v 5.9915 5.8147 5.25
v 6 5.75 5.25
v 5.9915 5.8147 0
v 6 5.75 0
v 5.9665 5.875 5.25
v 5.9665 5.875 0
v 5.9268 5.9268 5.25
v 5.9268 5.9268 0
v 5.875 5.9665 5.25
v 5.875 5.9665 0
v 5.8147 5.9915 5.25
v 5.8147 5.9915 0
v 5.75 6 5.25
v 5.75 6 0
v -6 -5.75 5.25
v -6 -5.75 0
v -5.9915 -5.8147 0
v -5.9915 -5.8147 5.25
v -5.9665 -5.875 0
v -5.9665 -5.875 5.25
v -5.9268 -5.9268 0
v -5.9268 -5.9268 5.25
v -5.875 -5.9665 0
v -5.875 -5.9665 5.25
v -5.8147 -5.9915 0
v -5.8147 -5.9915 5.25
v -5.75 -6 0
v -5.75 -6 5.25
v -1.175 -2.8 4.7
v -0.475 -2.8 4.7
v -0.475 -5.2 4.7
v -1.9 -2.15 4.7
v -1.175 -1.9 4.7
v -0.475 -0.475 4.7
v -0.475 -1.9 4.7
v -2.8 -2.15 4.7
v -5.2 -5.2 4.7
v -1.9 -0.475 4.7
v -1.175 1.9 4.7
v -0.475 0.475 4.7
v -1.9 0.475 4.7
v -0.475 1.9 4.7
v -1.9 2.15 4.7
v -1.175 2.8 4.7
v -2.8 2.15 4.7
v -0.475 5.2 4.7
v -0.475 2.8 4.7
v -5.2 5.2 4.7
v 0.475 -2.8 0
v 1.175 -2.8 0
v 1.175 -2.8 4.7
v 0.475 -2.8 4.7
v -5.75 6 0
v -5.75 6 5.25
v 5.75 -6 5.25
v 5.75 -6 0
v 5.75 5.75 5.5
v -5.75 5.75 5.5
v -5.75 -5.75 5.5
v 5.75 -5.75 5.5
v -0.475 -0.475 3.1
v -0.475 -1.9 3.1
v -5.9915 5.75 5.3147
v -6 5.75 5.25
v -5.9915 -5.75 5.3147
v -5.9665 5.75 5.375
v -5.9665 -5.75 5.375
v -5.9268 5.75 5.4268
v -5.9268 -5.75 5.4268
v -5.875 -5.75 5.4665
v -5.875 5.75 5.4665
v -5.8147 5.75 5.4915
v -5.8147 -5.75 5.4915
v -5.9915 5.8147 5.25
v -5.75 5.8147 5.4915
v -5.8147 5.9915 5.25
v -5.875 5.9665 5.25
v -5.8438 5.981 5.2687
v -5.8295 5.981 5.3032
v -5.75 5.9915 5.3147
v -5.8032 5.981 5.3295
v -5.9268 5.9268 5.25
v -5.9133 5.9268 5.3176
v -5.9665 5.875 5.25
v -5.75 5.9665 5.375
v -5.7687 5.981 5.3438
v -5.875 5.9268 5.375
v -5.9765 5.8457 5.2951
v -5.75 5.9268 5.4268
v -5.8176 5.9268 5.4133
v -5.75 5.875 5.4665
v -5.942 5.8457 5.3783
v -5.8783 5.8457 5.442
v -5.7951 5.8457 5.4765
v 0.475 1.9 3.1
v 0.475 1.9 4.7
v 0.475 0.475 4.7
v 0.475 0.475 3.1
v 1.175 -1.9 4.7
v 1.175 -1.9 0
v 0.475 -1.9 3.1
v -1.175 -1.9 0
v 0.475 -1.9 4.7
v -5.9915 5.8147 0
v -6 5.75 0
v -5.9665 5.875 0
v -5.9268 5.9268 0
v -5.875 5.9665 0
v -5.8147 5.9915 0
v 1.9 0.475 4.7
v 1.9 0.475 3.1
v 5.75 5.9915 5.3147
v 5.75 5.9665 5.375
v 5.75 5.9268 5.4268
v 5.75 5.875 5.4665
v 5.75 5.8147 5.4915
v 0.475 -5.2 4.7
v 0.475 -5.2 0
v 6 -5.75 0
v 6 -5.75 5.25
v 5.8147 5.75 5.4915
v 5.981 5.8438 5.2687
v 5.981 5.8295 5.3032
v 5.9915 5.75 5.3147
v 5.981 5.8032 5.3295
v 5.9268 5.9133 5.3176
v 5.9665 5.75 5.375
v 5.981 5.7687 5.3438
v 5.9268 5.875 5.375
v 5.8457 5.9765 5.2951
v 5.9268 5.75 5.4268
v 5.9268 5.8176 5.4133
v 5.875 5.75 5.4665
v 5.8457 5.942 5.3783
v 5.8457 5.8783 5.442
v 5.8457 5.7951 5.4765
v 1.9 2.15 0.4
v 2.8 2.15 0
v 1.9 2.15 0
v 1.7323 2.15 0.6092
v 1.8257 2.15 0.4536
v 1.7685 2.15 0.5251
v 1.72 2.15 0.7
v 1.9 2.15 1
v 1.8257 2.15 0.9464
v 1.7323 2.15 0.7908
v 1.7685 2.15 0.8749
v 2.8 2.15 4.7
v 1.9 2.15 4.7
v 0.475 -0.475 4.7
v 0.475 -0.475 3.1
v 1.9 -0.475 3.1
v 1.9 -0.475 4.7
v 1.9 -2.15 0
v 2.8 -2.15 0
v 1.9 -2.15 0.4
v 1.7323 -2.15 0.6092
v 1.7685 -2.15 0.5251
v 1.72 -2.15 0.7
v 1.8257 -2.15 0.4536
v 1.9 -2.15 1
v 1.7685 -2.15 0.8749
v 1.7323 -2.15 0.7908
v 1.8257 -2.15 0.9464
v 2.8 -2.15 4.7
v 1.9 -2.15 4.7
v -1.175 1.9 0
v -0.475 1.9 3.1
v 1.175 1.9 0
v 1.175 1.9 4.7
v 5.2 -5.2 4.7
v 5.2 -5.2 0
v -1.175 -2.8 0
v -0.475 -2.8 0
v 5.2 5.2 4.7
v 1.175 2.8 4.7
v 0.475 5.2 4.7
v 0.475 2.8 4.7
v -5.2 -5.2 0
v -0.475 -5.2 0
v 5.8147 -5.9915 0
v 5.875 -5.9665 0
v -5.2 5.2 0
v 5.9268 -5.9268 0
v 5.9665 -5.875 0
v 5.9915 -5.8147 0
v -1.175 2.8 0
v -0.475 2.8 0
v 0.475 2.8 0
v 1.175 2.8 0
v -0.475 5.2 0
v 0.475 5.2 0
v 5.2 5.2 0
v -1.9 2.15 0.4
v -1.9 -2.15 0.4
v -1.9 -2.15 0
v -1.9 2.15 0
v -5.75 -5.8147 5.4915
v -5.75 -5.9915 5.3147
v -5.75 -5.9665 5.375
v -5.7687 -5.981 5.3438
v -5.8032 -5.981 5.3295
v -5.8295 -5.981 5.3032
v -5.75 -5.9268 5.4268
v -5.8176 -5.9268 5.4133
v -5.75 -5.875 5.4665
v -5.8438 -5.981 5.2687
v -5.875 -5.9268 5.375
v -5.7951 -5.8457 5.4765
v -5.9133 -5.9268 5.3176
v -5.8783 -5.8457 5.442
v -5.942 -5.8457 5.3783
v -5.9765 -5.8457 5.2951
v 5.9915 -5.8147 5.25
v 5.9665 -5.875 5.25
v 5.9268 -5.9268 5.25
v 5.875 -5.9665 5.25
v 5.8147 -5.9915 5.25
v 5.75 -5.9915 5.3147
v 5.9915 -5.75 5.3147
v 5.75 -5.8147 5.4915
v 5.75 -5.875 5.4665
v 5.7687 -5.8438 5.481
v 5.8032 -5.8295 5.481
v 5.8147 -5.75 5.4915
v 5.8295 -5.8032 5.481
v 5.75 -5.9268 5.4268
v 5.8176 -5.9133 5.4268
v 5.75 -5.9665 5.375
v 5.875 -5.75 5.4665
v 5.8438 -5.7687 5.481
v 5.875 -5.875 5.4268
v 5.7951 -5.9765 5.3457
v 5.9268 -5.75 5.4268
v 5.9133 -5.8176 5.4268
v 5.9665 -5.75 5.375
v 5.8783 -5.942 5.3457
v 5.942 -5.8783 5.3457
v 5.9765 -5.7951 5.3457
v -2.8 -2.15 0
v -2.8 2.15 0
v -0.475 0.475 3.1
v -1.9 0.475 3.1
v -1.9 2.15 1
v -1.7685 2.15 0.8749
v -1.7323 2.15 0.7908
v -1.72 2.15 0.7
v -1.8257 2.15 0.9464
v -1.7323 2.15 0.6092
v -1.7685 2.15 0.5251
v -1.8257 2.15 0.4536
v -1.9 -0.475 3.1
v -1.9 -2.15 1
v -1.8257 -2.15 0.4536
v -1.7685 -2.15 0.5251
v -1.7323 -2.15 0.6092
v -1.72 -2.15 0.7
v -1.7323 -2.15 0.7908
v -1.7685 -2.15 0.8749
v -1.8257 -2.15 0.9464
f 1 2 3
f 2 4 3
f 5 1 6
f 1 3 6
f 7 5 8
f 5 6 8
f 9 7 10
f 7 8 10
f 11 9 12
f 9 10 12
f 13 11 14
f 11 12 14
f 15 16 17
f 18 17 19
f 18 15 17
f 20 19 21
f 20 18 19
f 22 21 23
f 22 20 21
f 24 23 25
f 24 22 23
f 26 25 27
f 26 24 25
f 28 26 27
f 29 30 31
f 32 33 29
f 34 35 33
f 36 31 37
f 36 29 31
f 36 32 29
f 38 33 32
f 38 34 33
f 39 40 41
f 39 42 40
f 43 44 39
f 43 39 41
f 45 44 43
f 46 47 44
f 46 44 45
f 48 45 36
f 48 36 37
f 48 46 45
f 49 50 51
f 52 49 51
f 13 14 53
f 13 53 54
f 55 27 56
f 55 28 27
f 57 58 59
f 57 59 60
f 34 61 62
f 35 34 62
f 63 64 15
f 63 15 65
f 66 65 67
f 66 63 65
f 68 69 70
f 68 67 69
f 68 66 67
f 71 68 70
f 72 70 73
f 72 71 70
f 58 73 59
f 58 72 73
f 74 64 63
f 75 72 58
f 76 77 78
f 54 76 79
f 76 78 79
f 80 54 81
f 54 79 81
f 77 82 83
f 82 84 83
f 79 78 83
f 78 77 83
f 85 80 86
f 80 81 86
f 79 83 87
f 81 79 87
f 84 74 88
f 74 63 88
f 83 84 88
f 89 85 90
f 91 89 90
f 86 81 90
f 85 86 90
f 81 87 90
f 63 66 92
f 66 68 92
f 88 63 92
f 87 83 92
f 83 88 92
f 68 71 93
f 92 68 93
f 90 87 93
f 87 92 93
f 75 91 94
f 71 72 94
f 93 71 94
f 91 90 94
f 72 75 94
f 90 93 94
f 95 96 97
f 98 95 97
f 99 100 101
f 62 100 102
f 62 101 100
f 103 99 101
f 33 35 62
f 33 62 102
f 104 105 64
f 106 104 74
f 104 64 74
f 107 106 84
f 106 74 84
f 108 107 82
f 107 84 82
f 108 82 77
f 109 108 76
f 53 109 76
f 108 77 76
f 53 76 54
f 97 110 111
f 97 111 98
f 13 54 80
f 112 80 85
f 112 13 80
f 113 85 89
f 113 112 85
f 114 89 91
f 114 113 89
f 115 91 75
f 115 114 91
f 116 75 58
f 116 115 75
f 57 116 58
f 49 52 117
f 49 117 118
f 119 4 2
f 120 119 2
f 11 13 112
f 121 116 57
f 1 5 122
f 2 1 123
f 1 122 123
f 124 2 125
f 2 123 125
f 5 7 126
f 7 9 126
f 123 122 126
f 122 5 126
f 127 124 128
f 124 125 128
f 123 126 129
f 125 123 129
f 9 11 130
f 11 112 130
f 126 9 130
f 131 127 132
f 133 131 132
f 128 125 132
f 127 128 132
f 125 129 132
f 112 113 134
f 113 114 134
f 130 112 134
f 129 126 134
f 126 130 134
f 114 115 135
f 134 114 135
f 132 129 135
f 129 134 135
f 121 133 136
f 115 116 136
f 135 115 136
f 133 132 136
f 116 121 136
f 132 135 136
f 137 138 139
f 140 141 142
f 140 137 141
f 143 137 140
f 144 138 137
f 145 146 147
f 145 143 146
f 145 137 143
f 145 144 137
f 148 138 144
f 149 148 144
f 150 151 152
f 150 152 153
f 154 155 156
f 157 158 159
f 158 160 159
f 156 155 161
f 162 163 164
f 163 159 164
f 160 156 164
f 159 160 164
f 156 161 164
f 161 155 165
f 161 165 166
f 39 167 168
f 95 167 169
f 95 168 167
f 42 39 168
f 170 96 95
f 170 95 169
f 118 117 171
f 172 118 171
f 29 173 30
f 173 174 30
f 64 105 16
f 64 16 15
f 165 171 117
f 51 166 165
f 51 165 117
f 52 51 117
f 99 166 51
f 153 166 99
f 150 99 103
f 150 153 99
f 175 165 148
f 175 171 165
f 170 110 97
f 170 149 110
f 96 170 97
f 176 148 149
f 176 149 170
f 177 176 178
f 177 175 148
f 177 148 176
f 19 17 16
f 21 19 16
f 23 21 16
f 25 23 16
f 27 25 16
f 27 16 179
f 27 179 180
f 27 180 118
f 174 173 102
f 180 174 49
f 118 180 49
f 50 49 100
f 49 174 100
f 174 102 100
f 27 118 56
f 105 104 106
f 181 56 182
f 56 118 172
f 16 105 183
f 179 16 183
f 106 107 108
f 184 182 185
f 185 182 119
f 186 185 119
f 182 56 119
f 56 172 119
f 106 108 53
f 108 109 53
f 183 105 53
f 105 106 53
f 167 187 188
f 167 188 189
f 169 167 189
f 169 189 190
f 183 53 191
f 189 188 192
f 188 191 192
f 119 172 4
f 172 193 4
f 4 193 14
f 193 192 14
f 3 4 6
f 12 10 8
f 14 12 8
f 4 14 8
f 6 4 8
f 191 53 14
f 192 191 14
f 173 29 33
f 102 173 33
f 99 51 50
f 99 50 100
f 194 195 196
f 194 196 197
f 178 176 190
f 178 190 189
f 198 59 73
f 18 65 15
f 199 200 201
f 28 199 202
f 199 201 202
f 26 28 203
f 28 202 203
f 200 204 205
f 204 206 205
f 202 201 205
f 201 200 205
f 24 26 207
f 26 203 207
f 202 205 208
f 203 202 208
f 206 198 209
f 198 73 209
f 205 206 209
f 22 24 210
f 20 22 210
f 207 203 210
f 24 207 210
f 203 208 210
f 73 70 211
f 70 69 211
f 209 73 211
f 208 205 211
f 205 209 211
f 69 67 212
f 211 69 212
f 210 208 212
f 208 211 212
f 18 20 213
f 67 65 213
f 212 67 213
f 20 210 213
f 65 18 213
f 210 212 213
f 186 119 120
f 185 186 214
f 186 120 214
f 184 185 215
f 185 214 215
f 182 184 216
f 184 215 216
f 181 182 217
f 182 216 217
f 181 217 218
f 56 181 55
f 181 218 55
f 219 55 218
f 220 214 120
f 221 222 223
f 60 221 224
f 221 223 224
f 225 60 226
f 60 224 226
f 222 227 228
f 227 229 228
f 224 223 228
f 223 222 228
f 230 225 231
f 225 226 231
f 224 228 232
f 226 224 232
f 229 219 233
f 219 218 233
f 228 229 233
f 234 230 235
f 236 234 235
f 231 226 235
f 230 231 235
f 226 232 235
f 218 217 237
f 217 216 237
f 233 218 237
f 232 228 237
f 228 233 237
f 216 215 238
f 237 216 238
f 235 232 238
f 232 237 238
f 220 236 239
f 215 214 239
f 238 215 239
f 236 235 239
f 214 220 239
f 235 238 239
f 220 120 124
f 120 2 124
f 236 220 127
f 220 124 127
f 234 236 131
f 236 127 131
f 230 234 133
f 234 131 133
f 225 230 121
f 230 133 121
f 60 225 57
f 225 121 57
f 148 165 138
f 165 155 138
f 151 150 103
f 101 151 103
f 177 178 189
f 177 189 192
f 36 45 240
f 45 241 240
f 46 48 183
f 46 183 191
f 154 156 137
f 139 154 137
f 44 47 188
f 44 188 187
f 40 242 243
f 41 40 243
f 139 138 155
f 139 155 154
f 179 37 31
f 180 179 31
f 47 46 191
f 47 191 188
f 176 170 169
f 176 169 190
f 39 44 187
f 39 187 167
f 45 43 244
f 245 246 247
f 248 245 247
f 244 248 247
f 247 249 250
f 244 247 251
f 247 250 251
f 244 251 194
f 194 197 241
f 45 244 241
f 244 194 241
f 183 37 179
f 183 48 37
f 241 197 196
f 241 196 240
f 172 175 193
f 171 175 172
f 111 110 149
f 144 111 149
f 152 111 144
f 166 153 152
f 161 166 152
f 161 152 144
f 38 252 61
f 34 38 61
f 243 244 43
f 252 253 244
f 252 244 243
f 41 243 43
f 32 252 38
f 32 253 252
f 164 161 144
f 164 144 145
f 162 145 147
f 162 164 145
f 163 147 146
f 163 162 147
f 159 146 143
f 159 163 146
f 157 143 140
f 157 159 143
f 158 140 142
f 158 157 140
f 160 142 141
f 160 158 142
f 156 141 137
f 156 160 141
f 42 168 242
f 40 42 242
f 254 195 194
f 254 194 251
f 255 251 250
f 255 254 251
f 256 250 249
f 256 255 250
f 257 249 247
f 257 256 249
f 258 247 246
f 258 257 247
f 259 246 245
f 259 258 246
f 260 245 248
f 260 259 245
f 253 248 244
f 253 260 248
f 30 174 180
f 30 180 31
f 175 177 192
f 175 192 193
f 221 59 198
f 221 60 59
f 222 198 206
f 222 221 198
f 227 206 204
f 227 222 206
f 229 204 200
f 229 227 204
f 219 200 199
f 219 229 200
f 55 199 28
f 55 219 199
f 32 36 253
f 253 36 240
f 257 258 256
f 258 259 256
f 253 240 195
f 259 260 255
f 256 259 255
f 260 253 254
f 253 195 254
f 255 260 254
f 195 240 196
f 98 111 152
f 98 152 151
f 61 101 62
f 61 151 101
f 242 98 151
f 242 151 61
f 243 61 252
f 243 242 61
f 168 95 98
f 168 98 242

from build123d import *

# Parameters (mm, degrees)
BOSS_EXTRU_1_DEPTH      = 4.3
ESQUISSE2_W             = 5.6
ESQUISSE2_H             = 2.4
BOSS_EXTRU_2_DEPTH      = 0.65
ESQUISSE3_W             = 2.4
ESQUISSE3_H             = 4.95
BOSS_EXTRU_3_DEPTH      = 2.4
ESQUISSE4_W             = 8
ESQUISSE4_H             = 2.4
BOSS_EXTRU_4_DEPTH      = 3.85
ESQUISSE5_W             = 2.4
ESQUISSE5_H             = 8.8
BOSS_EXTRU_5_DEPTH      = 3.2
ESQUISSE6_W             = 2.35
ESQUISSE6_H             = 0.9
BOSS_EXTRU_6_DEPTH      = 3.1
ESQUISSE7_W             = 0.9
ESQUISSE7_H             = 4.3
BOSS_EXTRU_7_DEPTH      = 0.4
ESQUISSE8_W             = 0.9
ESQUISSE8_H             = 4.3
BOSS_EXTRU_8_DEPTH      = 0.4
ESQUISSE9_W             = 5.5
ESQUISSE9_H             = 8.8
BOSS_EXTRU_9_DEPTH      = 0.8
BOSS_EXTRU_10_DEPTH     = 2.4
ESQUISSE11_W            = 12
ESQUISSE11_H            = 5.5
BOSS_EXTRU_11_DEPTH     = 0.8
ENL_V_MAT_EXTRU_1_DEPTH = 1.6
ENL_V_MAT_EXTRU_2_REACH = 12.401
ESQUISSE13_W            = 1.425
ESQUISSE13_H            = 1.6
ENL_V_MAT_EXTRU_3_REACH = 12.401
ESQUISSE14_W            = 1.425
ESQUISSE14_H            = 1.6
ENL_V_MAT_EXTRU_4_DEPTH = 1.6
CONG_1_R                = 0.25


with BuildPart() as part:
    # Esquisse1 → Boss.-Extru.1 (new body)
    with BuildSketch(Plane.XZ.offset(2.15)):
        with BuildLine():
            Line((1.9, 0.4), (2.8, 0.4))
            Line((2.8, 0.4), (2.8, 5.5))
            Line((2.8, 5.5), (-2.8, 5.5))
            Line((-2.8, 5.5), (-2.8, 0.4))
            Line((-2.8, 0.4), (-1.9, 0.4))
            ThreePointArc((-1.9, 0.4), (-1.72, 0.7), (-1.9, 1))
            Line((-1.9, 1), (-1.9, 3.1))
            Line((-1.9, 3.1), (1.9, 3.1))
            Line((1.9, 3.1), (1.9, 1))
            ThreePointArc((1.9, 1), (1.72, 0.7), (1.9, 0.4))
        make_face()
    extrude(amount=-BOSS_EXTRU_1_DEPTH)

    # Esquisse2 → Boss.-Extru.2 (add)
    with BuildSketch(Plane.XZ.offset(2.15)):
        with Locations((0, 4.3)):
            Rectangle(ESQUISSE2_W, ESQUISSE2_H)
    extrude(amount=BOSS_EXTRU_2_DEPTH)

    # Esquisse3 → Boss.-Extru.3 (add)
    with BuildSketch(Plane.ZY.offset(2.8)):
        with Locations((4.3, -0.325)):
            Rectangle(ESQUISSE3_W, ESQUISSE3_H)
    extrude(amount=BOSS_EXTRU_3_DEPTH)

    # Esquisse4 → Boss.-Extru.4 (add)
    with BuildSketch(Plane(origin=(0, 2.15, 0), x_dir=(-1, 0, 0), z_dir=(0, 1, 0))):
        with Locations((1.2, 4.3)):
            Rectangle(ESQUISSE4_W, ESQUISSE4_H)
    extrude(amount=BOSS_EXTRU_4_DEPTH)

    # Esquisse5 → Boss.-Extru.5 (add)
    with BuildSketch(Plane(origin=(2.8, 0, 0), x_dir=(0, 0, -1), z_dir=(1, 0, 0))):
        with Locations((-4.3, 1.6)):
            Rectangle(ESQUISSE5_W, ESQUISSE5_H)
    extrude(amount=BOSS_EXTRU_5_DEPTH)

    # Esquisse6 → Boss.-Extru.6 (add)
    with BuildSketch(Plane(origin=(0, 0, 3.1), x_dir=(-1, 0, 0), z_dir=(0, 0, -1))):
        Polygon((5.2, 5.2), (0.475, 5.2), (0.475, 2.8), (1.175, 2.8), (1.175, 1.9), (-1.175, 1.9), (-1.175, 2.8), (-0.475, 2.8), (-0.475, 5.2), (-5.2, 5.2), (-5.2, -2.8), (-6, -2.8), (-6, 6), (5.2, 6), align=None)
        with Locations((0, -2.35)):
            Rectangle(ESQUISSE6_W, ESQUISSE6_H)
    extrude(amount=BOSS_EXTRU_6_DEPTH)

    # Esquisse7 → Boss.-Extru.7 (add)
    with BuildSketch(Plane(origin=(0, 0, 0.4), x_dir=(-1, 0, 0), z_dir=(0, 0, -1))):
        with Locations((2.35, 0)):
            Rectangle(ESQUISSE7_W, ESQUISSE7_H)
    extrude(amount=BOSS_EXTRU_7_DEPTH)

    # Esquisse8 → Boss.-Extru.8 (add)
    with BuildSketch(Plane(origin=(0, 0, 0.4), x_dir=(-1, 0, 0), z_dir=(0, 0, -1))):
        with Locations((-2.35, 0)):
            Rectangle(ESQUISSE8_W, ESQUISSE8_H)
    extrude(amount=BOSS_EXTRU_8_DEPTH)

    # Esquisse9 → Boss.-Extru.9 (add)
    with BuildSketch(Plane.ZY.offset(5.2)):
        with Locations((2.75, 1.6)):
            Rectangle(ESQUISSE9_W, ESQUISSE9_H)
    extrude(amount=BOSS_EXTRU_9_DEPTH)

    # Esquisse10 → Boss.-Extru.10 (add)
    with BuildSketch(Plane.XZ.offset(2.8)):
        Polygon((-0.475, 3.1), (-5.2, 3.1), (-5.2, 0), (-6, 0), (-6, 5.5), (6, 5.5), (6, 0), (5.2, 0), (5.2, 3.1), (0.475, 3.1), (0.475, 0), (-0.475, 0), align=None)
    extrude(amount=BOSS_EXTRU_10_DEPTH)

    # Esquisse11 → Boss.-Extru.11 (add)
    with BuildSketch(Plane.XZ.offset(5.2)):
        with Locations((0, 2.75)):
            Rectangle(ESQUISSE11_W, ESQUISSE11_H)
    extrude(amount=BOSS_EXTRU_11_DEPTH)

    # Esquisse12 → Enlèv. mat.-Extru.1 (cut)
    with BuildSketch(Plane(origin=(0, 0, 3.1), x_dir=(-1, 0, 0), z_dir=(0, 0, -1))):
        Polygon((-1.9, 0.475), (-1.175, 0.475), (-1.175, 2.8), (-0.475, 2.8), (-0.475, 5.2), (-5.2, 5.2), (-5.2, -5.2), (-0.475, -5.2), (-0.475, -2.8), (-1.175, -2.8), (-1.175, -0.475), (-1.9, -0.475), (-1.9, -2.15), (-2.8, -2.15), (-2.8, 2.15), (-1.9, 2.15), align=None)
    extrude(amount=-ENL_V_MAT_EXTRU_1_DEPTH, mode=Mode.SUBTRACT)

    # Esquisse13 → Enlèv. mat.-Extru.2 (cut, up to next)
    with BuildSketch(Plane(origin=(0.475, 0, 0), x_dir=(0, -1, 0), z_dir=(-1, 0, 0)), mode=Mode.PRIVATE) as enl_v_mat_extru_2_sk1:
        with Locations((-1.1875, 3.9)):
            Rectangle(ESQUISSE13_W, ESQUISSE13_H)
    enl_v_mat_extru_2_tool1 = extrude(enl_v_mat_extru_2_sk1.sketch, amount=-ENL_V_MAT_EXTRU_2_REACH, mode=Mode.PRIVATE) & part.part
    add(enl_v_mat_extru_2_tool1.solids().sort_by_distance((0.475, 1.1875, 3.9))[0], mode=Mode.SUBTRACT)

    # Esquisse14 → Enlèv. mat.-Extru.3 (cut, up to next)
    with BuildSketch(Plane(origin=(0.475, 0, 0), x_dir=(0, -1, 0), z_dir=(-1, 0, 0)), mode=Mode.PRIVATE) as enl_v_mat_extru_3_sk1:
        with Locations((1.1875, 3.9)):
            Rectangle(ESQUISSE14_W, ESQUISSE14_H)
    enl_v_mat_extru_3_tool1 = extrude(enl_v_mat_extru_3_sk1.sketch, amount=-ENL_V_MAT_EXTRU_3_REACH, mode=Mode.PRIVATE) & part.part
    add(enl_v_mat_extru_3_tool1.solids().sort_by_distance((0.475, -1.1875, 3.9))[0], mode=Mode.SUBTRACT)

    # Esquisse15 → Enlèv. mat.-Extru.4 (cut)
    with BuildSketch(Plane(origin=(0, 0, 3.1), x_dir=(-1, 0, 0), z_dir=(0, 0, -1))):
        Polygon((0.475, 0.475), (1.9, 0.475), (1.9, 2.15), (2.8, 2.15), (2.8, -2.15), (1.9, -2.15), (1.9, -0.475), (0.475, -0.475), (0.475, -1.9), (1.175, -1.9), (1.175, -2.8), (0.475, -2.8), (0.475, -5.2), (5.2, -5.2), (5.2, 5.2), (0.475, 5.2), (0.475, 2.8), (1.175, 2.8), (1.175, 1.9), (0.475, 1.9), align=None)
    extrude(amount=-ENL_V_MAT_EXTRU_4_DEPTH, mode=Mode.SUBTRACT)

    # Congé1
    cong_1_edges = [part.edges().sort_by_distance(p)[0] for p in [
        (-6, 0, 5.5),
        (-6, 6, 2.75),
        (6, -6, 2.75),
        (0, -6, 5.5),
        (-6, -6, 2.75),
        (0, 6, 5.5),
        (6, 6, 2.75),
        (6, 0, 5.5),
    ]]
    fillet(cong_1_edges, radius=CONG_1_R)


solid = part.part
